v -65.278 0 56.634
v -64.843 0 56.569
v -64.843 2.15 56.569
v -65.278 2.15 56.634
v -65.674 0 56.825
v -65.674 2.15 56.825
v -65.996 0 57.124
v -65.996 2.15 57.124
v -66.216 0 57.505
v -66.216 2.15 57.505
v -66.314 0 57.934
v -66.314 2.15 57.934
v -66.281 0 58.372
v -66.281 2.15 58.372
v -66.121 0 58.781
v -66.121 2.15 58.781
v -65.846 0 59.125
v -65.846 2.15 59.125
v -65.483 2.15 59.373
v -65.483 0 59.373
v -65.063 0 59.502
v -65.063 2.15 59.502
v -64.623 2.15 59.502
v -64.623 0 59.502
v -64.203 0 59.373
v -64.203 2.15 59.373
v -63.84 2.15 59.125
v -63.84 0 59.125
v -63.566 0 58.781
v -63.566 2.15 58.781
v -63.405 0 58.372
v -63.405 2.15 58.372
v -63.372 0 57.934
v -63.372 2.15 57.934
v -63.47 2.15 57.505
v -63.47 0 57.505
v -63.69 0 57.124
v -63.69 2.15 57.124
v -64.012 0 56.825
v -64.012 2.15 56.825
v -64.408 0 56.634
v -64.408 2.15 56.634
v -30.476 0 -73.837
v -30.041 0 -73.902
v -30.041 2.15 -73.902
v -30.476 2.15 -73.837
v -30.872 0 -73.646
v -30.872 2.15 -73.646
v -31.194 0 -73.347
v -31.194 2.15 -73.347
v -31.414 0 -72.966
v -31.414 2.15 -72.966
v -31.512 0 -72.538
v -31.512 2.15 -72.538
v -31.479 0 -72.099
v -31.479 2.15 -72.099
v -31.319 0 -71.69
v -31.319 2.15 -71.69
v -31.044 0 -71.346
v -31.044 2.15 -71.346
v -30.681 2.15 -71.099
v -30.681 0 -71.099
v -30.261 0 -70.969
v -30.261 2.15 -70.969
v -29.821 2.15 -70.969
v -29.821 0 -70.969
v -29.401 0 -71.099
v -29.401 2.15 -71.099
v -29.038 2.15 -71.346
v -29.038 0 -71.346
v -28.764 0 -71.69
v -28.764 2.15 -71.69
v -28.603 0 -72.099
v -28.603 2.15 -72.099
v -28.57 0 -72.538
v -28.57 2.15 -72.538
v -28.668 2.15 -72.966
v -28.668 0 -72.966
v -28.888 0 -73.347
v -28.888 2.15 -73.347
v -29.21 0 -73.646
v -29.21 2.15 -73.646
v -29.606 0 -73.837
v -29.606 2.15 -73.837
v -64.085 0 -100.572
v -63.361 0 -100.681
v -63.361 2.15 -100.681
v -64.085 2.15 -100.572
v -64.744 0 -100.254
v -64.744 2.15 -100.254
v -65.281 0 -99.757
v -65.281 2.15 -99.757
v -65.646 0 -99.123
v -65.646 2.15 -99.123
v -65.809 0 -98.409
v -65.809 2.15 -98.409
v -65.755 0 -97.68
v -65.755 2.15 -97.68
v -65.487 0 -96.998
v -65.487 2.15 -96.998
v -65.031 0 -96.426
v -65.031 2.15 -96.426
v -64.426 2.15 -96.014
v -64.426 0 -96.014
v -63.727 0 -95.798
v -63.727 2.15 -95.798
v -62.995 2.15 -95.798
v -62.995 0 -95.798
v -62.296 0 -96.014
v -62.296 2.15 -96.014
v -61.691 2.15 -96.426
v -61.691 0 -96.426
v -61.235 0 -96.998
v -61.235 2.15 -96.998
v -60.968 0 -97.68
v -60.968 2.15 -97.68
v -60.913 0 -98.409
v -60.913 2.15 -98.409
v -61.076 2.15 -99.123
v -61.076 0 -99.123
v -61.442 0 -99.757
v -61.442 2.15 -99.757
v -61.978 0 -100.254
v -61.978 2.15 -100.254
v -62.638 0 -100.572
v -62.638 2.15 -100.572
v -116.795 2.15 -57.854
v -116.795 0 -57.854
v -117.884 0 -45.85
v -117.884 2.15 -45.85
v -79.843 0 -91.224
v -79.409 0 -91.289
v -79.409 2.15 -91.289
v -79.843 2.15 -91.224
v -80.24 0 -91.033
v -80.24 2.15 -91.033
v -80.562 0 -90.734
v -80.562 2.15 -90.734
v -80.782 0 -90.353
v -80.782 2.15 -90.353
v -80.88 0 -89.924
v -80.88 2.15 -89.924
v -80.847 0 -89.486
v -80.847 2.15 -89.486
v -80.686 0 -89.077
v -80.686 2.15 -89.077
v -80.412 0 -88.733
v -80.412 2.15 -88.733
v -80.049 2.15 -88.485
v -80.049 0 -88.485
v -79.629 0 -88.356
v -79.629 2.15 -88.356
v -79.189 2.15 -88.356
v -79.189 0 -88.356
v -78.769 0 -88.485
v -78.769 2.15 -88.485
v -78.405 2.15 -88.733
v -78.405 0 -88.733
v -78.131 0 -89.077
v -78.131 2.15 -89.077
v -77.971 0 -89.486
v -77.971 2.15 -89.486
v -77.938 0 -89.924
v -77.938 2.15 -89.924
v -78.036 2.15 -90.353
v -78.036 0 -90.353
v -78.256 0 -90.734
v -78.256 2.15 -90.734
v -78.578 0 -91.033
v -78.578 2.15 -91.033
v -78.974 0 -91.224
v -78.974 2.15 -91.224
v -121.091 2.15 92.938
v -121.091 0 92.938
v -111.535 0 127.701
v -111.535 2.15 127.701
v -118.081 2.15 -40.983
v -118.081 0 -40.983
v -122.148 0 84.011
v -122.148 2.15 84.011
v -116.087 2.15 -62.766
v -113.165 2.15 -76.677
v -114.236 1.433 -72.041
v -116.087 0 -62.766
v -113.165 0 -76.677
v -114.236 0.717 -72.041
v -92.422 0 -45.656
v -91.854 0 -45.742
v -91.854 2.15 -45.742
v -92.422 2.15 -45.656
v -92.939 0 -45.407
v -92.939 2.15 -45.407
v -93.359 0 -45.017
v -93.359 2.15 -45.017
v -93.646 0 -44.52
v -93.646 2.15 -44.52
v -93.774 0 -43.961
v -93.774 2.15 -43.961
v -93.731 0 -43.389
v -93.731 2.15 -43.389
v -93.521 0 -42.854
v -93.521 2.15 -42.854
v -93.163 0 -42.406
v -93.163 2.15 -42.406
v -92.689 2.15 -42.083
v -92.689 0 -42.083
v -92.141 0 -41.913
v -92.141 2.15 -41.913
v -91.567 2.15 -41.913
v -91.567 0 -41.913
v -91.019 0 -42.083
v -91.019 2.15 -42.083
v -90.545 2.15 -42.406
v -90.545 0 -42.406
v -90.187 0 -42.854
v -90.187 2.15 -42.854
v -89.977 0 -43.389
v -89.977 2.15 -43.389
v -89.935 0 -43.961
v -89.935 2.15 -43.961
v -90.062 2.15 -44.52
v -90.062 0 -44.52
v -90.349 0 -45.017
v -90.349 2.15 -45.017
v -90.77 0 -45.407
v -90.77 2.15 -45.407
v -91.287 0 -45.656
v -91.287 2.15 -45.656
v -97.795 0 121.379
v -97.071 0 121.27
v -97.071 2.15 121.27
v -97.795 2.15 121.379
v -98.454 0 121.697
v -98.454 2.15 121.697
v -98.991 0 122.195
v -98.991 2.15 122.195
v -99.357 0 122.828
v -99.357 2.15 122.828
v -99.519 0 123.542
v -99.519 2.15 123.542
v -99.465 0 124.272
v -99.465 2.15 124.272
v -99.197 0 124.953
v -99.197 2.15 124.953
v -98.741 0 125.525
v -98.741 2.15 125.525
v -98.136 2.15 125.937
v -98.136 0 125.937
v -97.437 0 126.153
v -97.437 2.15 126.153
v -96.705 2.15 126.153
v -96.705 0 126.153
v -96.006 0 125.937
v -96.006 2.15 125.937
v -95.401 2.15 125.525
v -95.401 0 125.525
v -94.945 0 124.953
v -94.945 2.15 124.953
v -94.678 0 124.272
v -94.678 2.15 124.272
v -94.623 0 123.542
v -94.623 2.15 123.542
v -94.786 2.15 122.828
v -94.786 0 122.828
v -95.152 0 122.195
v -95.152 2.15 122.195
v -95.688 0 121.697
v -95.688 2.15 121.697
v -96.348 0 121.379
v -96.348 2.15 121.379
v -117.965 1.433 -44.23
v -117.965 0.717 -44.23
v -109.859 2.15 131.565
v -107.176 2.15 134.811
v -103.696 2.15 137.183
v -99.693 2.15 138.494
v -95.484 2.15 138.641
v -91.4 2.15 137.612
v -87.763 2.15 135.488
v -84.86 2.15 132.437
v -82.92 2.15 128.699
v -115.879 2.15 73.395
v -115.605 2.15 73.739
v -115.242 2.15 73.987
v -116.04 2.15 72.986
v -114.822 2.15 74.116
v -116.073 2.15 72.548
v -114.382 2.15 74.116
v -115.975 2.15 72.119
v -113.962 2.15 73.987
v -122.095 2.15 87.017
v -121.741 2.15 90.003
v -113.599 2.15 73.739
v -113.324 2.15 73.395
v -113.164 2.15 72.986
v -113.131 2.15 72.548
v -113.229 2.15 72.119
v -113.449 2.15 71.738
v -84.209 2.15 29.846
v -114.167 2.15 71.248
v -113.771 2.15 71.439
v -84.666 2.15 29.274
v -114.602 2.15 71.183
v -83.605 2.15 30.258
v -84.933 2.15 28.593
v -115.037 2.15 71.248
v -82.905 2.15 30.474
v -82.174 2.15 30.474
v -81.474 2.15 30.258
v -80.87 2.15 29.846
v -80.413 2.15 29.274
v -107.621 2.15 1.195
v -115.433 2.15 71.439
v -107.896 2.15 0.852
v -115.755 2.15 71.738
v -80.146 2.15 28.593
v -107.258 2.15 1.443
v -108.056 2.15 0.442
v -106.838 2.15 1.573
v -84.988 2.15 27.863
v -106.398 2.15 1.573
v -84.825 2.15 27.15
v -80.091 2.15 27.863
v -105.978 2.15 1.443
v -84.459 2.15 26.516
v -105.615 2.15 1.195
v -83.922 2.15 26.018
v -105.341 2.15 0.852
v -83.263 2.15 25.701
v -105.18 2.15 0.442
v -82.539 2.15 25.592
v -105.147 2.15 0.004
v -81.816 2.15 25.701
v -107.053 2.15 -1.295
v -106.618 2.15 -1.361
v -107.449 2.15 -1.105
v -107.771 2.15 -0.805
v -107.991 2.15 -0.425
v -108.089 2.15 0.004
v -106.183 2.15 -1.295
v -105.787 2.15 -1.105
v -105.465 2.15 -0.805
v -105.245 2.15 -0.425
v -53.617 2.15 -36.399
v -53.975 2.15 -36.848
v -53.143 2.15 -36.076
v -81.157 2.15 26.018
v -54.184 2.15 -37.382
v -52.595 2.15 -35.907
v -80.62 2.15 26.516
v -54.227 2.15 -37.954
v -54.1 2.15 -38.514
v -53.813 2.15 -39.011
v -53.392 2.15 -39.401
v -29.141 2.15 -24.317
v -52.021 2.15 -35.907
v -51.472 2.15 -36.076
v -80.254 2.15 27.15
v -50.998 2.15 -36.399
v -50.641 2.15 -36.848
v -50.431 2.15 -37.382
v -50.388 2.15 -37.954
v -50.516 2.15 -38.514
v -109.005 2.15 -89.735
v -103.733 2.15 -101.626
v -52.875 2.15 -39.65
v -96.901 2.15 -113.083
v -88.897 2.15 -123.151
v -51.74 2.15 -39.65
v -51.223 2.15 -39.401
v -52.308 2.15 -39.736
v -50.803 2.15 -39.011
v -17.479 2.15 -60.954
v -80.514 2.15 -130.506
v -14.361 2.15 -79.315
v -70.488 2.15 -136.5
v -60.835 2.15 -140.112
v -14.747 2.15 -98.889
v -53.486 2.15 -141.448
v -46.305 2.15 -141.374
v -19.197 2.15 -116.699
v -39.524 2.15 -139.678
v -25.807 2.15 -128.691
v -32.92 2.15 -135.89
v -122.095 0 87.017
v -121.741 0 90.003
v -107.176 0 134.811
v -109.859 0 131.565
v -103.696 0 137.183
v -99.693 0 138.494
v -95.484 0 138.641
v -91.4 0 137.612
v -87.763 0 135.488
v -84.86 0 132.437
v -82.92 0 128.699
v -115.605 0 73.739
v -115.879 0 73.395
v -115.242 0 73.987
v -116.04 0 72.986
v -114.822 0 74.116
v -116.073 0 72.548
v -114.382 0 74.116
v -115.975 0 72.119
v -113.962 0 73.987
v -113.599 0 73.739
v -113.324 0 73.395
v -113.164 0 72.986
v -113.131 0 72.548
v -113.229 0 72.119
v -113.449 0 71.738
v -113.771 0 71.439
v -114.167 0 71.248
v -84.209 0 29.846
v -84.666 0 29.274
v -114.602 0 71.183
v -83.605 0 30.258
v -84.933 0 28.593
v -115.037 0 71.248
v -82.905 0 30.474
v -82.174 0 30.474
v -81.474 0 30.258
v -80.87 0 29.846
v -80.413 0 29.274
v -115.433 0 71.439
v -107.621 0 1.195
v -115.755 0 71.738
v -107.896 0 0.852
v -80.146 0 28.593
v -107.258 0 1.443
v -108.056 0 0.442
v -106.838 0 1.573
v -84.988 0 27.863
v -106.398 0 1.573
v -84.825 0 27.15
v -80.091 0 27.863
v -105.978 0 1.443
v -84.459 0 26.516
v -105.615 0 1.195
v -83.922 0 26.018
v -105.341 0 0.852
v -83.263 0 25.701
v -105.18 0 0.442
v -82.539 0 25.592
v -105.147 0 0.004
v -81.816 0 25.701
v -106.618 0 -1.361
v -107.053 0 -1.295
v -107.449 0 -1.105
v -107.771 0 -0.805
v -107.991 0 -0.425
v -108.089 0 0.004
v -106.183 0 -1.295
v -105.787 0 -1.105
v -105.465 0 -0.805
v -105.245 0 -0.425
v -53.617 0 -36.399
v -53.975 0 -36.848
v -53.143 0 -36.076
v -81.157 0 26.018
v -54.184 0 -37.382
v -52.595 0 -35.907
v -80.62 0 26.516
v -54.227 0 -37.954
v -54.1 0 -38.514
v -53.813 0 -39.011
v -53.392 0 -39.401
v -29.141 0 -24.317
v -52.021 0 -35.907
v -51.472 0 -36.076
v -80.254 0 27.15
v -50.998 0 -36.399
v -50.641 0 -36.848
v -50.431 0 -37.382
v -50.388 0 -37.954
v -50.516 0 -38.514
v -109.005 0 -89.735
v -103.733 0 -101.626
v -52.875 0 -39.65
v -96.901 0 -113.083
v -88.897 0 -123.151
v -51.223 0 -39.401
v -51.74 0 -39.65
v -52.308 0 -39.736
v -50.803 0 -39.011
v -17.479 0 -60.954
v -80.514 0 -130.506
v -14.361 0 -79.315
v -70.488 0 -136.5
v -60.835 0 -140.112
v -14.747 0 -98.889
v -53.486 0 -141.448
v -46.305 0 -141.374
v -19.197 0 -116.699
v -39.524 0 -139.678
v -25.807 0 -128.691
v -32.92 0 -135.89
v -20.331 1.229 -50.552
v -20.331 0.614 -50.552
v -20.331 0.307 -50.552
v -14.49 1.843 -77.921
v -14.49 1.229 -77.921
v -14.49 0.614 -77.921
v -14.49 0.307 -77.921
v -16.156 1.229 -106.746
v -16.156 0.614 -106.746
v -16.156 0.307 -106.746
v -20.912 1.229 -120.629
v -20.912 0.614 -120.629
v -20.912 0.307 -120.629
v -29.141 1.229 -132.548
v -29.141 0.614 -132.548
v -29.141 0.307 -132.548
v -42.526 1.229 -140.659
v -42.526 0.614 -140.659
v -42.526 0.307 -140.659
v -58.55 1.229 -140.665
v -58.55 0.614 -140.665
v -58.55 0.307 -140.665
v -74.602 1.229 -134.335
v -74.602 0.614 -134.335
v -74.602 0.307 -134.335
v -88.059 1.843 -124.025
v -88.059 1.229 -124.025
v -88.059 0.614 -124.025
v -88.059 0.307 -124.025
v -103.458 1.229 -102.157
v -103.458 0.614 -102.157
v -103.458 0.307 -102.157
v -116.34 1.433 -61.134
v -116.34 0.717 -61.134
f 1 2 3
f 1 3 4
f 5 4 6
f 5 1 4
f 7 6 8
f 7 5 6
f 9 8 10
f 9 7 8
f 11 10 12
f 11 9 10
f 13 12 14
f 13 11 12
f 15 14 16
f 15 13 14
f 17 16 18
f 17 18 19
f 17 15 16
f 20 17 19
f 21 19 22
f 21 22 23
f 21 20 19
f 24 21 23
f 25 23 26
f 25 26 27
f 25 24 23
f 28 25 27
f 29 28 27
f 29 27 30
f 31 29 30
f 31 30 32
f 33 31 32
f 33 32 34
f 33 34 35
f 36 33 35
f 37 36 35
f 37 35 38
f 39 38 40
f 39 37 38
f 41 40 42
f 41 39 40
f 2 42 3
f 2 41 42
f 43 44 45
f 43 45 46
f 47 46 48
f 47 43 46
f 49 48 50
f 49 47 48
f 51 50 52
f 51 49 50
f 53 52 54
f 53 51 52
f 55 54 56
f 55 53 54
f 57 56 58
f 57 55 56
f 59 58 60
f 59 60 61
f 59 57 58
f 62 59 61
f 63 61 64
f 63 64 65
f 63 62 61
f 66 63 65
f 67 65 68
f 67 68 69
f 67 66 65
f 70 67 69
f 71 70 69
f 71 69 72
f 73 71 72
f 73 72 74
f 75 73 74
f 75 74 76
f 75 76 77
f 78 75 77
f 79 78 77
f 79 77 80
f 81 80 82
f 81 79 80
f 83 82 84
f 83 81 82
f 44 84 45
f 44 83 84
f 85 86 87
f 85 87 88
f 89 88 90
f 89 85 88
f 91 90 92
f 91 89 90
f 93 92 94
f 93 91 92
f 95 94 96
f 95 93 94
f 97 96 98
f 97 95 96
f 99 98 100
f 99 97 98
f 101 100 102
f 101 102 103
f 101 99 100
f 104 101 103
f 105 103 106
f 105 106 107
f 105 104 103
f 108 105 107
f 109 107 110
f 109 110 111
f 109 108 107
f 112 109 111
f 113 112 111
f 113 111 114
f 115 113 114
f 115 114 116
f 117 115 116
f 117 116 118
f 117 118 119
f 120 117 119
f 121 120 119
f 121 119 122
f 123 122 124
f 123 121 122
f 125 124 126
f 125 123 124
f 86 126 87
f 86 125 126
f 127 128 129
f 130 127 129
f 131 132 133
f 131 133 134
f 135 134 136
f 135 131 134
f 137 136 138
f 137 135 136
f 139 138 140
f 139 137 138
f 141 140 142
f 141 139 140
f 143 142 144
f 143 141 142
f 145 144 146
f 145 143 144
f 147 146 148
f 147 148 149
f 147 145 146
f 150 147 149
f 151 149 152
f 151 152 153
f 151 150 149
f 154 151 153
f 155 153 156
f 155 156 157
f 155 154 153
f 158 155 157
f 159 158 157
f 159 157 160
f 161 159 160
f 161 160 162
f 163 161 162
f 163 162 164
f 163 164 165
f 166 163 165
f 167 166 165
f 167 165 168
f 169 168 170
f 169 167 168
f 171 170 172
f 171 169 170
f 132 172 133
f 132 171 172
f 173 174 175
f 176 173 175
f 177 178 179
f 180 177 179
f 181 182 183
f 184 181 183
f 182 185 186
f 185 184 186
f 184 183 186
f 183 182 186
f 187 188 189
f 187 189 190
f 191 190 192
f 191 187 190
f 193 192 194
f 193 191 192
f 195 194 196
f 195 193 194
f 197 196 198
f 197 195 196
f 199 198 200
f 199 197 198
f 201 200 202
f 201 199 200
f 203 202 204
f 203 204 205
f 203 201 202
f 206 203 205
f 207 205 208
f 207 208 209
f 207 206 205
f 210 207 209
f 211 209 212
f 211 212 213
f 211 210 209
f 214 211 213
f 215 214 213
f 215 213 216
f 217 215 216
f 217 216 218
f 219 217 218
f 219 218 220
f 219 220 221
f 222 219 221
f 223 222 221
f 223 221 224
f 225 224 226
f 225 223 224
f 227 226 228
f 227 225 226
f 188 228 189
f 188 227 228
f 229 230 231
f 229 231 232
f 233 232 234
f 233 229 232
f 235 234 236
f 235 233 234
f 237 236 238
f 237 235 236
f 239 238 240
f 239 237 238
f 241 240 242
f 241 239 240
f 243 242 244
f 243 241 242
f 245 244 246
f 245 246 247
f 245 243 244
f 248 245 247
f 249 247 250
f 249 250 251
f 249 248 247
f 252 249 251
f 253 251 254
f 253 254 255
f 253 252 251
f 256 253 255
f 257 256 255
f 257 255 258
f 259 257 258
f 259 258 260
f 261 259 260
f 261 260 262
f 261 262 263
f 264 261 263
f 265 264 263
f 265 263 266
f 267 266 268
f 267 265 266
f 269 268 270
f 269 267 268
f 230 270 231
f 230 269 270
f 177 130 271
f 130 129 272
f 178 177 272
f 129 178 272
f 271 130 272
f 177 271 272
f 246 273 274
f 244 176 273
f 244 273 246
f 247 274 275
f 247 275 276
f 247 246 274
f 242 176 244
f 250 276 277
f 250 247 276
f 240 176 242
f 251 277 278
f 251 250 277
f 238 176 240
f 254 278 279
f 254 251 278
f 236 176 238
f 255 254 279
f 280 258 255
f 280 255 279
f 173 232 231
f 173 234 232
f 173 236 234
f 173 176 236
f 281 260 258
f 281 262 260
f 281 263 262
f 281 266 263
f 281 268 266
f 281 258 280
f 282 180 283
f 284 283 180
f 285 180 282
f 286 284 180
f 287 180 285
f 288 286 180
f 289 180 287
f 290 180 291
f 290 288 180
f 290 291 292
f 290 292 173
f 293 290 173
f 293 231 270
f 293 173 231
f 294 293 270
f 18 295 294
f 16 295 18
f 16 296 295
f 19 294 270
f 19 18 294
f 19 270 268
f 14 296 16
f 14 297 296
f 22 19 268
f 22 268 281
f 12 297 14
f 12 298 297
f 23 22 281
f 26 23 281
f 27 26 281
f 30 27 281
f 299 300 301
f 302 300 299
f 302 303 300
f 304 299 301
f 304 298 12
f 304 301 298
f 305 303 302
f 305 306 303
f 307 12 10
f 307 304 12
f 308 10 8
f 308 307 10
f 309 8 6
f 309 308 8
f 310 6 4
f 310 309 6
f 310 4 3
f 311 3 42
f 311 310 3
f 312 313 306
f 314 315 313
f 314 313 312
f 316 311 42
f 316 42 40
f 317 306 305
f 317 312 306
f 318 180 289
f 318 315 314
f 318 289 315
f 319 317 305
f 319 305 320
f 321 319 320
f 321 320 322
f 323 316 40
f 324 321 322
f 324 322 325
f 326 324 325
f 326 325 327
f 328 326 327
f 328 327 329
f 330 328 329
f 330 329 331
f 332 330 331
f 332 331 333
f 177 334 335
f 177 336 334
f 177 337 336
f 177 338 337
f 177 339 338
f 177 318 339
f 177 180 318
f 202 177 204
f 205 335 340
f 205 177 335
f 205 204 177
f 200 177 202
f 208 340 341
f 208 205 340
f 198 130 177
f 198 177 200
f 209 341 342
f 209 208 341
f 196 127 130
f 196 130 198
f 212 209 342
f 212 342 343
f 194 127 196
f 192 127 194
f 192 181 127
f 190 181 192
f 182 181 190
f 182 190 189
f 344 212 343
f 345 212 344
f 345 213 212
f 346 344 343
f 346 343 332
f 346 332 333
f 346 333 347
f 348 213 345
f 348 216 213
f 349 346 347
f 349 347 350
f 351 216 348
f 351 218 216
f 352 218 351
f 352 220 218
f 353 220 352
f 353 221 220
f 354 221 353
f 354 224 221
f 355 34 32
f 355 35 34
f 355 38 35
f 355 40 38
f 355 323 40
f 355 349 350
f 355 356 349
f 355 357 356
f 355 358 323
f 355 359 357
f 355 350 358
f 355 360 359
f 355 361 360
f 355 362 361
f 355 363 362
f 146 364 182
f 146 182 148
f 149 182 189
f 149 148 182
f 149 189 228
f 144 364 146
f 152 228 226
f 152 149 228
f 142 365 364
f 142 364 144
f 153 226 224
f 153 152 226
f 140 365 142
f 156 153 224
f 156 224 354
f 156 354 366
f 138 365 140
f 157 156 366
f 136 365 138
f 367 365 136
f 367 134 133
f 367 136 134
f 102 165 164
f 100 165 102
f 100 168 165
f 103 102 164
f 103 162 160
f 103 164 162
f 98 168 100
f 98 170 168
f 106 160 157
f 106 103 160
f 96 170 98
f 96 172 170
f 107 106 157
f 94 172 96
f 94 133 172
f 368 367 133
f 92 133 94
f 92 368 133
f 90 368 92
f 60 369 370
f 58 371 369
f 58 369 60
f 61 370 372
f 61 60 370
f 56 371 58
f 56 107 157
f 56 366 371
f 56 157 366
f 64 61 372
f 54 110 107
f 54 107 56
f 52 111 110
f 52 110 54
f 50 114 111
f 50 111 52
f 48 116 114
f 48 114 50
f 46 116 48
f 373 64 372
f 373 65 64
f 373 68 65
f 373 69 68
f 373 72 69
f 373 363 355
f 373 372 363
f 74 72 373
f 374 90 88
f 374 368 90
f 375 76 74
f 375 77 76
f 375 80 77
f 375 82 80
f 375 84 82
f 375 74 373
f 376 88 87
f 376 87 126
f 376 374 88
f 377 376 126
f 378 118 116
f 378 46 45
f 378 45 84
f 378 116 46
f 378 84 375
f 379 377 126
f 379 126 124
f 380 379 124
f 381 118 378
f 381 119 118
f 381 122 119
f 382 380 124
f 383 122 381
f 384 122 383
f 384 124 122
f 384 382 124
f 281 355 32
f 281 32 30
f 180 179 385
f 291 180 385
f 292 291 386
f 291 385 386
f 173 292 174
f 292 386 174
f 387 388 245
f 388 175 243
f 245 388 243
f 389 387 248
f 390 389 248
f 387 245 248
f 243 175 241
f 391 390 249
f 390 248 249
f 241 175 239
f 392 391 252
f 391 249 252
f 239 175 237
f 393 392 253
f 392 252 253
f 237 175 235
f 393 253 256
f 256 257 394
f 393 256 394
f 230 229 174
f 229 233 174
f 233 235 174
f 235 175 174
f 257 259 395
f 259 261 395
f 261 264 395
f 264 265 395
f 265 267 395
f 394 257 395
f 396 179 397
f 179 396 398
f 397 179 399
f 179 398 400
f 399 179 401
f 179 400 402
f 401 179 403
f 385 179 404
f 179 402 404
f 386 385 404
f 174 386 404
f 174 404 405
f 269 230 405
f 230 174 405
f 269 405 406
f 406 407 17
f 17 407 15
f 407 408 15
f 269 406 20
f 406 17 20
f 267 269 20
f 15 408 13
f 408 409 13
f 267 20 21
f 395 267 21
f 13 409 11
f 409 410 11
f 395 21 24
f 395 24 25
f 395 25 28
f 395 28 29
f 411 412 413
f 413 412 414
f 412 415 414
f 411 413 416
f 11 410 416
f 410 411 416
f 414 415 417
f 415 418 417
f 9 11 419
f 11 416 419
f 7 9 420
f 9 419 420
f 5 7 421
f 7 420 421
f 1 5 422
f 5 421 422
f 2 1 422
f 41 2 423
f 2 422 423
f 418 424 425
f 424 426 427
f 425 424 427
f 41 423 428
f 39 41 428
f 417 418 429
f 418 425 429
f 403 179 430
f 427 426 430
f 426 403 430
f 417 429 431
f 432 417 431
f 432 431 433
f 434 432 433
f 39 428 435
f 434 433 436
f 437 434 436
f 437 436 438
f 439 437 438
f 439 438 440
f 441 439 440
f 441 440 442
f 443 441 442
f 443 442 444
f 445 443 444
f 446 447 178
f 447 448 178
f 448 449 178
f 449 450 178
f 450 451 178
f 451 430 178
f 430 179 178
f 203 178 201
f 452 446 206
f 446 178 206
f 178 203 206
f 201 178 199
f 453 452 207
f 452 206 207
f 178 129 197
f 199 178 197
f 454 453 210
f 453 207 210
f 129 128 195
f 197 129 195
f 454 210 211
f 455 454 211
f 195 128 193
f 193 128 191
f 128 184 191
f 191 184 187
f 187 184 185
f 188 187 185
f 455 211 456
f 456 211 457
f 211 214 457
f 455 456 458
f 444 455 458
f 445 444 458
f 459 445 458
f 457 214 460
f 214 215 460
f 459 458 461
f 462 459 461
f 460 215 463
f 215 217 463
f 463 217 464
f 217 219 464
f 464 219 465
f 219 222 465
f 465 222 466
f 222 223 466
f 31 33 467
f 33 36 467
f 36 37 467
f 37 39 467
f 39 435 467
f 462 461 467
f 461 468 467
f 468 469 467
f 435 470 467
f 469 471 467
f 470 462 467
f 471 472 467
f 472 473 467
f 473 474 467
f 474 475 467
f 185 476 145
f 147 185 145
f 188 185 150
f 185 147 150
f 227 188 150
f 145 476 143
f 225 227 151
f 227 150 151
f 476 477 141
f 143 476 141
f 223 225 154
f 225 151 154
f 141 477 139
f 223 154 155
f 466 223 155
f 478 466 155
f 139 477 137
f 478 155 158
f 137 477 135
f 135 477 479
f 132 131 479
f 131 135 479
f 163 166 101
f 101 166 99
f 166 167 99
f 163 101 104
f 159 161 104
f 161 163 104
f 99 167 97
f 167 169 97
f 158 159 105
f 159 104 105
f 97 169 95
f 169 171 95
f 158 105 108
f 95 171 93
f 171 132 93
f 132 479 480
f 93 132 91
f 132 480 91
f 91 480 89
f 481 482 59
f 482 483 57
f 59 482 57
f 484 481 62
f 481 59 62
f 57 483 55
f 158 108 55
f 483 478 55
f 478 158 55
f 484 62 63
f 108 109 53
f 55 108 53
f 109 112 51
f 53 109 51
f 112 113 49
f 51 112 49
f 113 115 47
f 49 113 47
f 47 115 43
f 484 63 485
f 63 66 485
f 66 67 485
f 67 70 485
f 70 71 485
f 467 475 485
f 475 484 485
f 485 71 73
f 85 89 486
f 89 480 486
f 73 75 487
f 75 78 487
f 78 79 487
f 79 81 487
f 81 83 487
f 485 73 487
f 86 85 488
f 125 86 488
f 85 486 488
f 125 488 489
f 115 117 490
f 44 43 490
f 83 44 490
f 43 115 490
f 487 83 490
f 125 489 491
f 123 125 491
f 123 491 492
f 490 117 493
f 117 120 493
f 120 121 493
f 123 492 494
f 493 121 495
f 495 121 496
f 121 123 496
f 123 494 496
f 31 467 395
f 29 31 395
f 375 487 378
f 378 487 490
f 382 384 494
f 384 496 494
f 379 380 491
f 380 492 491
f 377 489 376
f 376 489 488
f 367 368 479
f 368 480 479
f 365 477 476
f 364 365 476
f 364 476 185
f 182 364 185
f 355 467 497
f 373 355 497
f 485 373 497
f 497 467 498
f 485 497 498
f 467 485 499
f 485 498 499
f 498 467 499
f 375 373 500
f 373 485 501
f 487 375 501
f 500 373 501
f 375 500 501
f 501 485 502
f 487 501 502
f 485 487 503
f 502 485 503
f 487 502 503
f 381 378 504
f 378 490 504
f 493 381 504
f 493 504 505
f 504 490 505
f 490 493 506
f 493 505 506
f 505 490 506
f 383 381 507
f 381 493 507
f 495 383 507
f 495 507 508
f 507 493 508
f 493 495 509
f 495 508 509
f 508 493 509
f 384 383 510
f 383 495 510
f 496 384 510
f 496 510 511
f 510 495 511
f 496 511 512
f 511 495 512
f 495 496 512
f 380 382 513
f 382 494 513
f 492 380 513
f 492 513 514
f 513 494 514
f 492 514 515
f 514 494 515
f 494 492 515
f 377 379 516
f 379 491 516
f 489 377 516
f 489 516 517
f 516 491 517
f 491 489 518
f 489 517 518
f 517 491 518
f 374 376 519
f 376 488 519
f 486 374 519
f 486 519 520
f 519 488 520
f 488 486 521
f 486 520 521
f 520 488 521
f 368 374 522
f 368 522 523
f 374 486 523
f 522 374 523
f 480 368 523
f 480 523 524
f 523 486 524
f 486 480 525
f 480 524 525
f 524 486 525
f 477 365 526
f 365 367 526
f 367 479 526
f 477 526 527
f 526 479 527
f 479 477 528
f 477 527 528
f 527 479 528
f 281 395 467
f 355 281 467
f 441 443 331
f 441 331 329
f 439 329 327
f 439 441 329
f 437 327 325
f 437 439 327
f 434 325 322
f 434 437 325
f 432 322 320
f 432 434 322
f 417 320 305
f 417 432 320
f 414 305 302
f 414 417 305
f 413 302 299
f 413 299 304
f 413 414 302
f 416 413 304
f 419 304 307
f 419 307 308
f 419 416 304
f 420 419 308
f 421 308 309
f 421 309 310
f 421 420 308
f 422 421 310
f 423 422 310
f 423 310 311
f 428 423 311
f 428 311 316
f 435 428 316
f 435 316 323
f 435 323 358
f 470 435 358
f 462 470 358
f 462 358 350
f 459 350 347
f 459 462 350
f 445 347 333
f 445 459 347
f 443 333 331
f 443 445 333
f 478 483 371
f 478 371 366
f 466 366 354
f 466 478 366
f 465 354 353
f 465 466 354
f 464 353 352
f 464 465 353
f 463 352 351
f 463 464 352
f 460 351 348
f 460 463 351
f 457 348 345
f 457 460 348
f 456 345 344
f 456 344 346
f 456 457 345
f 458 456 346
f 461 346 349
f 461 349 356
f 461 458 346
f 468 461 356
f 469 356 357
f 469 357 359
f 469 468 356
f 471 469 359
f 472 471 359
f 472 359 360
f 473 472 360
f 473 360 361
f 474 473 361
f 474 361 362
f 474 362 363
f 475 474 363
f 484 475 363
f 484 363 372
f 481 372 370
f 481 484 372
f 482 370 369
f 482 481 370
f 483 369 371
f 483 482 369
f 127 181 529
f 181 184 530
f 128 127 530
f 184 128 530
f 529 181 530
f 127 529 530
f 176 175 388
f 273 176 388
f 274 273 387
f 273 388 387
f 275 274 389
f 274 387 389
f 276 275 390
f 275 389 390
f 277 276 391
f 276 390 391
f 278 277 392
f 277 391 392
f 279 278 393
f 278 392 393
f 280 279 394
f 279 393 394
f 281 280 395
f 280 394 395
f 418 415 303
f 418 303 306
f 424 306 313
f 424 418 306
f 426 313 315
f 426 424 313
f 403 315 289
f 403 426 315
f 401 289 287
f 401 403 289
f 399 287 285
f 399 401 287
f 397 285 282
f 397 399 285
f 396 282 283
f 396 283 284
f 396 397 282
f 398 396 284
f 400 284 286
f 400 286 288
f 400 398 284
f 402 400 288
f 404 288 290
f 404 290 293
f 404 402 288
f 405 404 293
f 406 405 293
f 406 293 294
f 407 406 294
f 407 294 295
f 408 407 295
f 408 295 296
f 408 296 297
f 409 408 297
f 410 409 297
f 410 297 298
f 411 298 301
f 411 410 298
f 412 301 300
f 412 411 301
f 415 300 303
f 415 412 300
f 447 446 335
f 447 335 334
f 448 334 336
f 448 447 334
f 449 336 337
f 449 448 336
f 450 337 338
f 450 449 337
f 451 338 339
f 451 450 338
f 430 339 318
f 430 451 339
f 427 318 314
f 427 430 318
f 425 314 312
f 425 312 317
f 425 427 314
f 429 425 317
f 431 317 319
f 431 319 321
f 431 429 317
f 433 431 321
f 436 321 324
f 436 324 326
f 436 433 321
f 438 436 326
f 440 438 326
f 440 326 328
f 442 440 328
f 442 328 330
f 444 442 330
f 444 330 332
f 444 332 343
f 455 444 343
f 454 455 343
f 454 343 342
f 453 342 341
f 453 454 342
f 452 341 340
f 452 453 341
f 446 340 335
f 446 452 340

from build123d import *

# Parameters (mm, degrees)
SKETCH1_R           = 2.455
SKETCH1_R_2         = 1.475
SKETCH1_R_3         = 1.925
BOSS_EXTRUDE1_DEPTH = 2.15


with BuildPart() as part:
    # Sketch1 → Boss-Extrude1 (new body)
    with BuildSketch(Plane(origin=(0, 0, 0), x_dir=(1, 0, 0), z_dir=(0, 1, 0))):
        with BuildLine():
            Line((-82.919787444, -128.698908445), (-29.140629004, 24.317395253))
            add(Edge.make_bspline(
                [(-29.140629004, 24.317395253), (-23.337858539, 41.277059327), (-12.859922069, 68.46207501), (-14.319919643, 106.433004768), (-23.539271508, 129.054084446), (-49.289871518, 148.405248856), (-78.031844676, 135.576474168), (-101.152133843, 109.291651208), (-108.95092469, 92.729531905), (-113.164975056, 76.676804997)],
                knots=[0.130450955, 0.130450955, 0.130450955, 0.130450955, 0.339996476, 0.443939453, 0.557712873, 0.600920567, 0.79656388, 0.817312416, 1, 1, 1, 1], degree=3))
            add(Edge.make_bspline(
                [(-113.164975056, 76.676804997), (-114.293306759, 72.049304665), (-115.240161991, 67.388956151), (-116.086927837, 62.766035919)],
                knots=[0.01328584, 0.01328584, 0.01328584, 0.01328584, 0.075217512, 0.075217512, 0.075217512, 0.075217512], degree=3))
            add(Edge.make_bspline(
                [(-116.086927837, 62.766035919), (-116.348548805, 61.136035297), (-116.584476112, 59.498418841), (-116.795112166, 57.854481822)],
                knots=[0.060715751, 0.060715751, 0.060715751, 0.060715751, 0.078641805, 0.078641805, 0.078641805, 0.078641805], degree=3))
            Line((-116.795112166, 57.854481822), (-117.884405612, 45.850341496))
            add(Edge.make_bspline(
                [(-117.884405612, 45.850341496), (-117.972649156, 44.230573242), (-118.037929563, 42.60779089), (-118.080616055, 40.983182889)],
                knots=[0, 0, 0, 0, 0.017419058, 0.017419058, 0.017419058, 0.017419058], degree=3))
            Line((-118.080616055, 40.983182889), (-122.147838246, -84.01073193))
            ThreePointArc((-122.147838246, -84.01073193), (-121.955556235, -88.514252193), (-121.090684612, -92.938126535))
            Line((-121.090684612, -92.938126535), (-111.534695628, -127.701111051))
            ThreePointArc((-111.534695628, -127.701111051), (-97.593937187, -138.716134992), (-82.919787444, -128.698908445))
        make_face()
        with Locations(Location((-97.07120722, -123.72524598, 0), (0, 0, 90))):
            Circle(SKETCH1_R, mode=Mode.SUBTRACT)
        with Locations(Location((-114.601772791, -72.657901757, 0), (0, 0, 90))):
            Circle(SKETCH1_R_2, mode=Mode.SUBTRACT)
        with Locations(Location((-64.843187058, -58.043882944, 0), (0, 0, 90))):
            Circle(SKETCH1_R_2, mode=Mode.SUBTRACT)
        with Locations(Location((-82.539469357, -28.04652318, 0), (0, 0, 90))):
            Circle(SKETCH1_R, mode=Mode.SUBTRACT)
        with Locations(Location((-106.618198832, -0.114198055, 0), (0, 0, 90))):
            Circle(SKETCH1_R_2, mode=Mode.SUBTRACT)
        with Locations(Location((-52.307689331, 37.810609892, 0), (0, 0, 90))):
            Circle(SKETCH1_R_3, mode=Mode.SUBTRACT)
        with Locations(Location((-91.854166633, 43.816950954, 0), (0, 0, 90))):
            Circle(SKETCH1_R_3, mode=Mode.SUBTRACT)
        with Locations(Location((-30.041231326, 72.427446852, 0), (0, 0, 90))):
            Circle(SKETCH1_R_2, mode=Mode.SUBTRACT)
        with Locations(Location((-79.40873095, 89.814244628, 0), (0, 0, 90))):
            Circle(SKETCH1_R_2, mode=Mode.SUBTRACT)
        with Locations(Location((-63.361132615, 98.225969641, 0), (0, 0, 90))):
            Circle(SKETCH1_R, mode=Mode.SUBTRACT)
    extrude(amount=BOSS_EXTRUDE1_DEPTH)


solid = part.part
